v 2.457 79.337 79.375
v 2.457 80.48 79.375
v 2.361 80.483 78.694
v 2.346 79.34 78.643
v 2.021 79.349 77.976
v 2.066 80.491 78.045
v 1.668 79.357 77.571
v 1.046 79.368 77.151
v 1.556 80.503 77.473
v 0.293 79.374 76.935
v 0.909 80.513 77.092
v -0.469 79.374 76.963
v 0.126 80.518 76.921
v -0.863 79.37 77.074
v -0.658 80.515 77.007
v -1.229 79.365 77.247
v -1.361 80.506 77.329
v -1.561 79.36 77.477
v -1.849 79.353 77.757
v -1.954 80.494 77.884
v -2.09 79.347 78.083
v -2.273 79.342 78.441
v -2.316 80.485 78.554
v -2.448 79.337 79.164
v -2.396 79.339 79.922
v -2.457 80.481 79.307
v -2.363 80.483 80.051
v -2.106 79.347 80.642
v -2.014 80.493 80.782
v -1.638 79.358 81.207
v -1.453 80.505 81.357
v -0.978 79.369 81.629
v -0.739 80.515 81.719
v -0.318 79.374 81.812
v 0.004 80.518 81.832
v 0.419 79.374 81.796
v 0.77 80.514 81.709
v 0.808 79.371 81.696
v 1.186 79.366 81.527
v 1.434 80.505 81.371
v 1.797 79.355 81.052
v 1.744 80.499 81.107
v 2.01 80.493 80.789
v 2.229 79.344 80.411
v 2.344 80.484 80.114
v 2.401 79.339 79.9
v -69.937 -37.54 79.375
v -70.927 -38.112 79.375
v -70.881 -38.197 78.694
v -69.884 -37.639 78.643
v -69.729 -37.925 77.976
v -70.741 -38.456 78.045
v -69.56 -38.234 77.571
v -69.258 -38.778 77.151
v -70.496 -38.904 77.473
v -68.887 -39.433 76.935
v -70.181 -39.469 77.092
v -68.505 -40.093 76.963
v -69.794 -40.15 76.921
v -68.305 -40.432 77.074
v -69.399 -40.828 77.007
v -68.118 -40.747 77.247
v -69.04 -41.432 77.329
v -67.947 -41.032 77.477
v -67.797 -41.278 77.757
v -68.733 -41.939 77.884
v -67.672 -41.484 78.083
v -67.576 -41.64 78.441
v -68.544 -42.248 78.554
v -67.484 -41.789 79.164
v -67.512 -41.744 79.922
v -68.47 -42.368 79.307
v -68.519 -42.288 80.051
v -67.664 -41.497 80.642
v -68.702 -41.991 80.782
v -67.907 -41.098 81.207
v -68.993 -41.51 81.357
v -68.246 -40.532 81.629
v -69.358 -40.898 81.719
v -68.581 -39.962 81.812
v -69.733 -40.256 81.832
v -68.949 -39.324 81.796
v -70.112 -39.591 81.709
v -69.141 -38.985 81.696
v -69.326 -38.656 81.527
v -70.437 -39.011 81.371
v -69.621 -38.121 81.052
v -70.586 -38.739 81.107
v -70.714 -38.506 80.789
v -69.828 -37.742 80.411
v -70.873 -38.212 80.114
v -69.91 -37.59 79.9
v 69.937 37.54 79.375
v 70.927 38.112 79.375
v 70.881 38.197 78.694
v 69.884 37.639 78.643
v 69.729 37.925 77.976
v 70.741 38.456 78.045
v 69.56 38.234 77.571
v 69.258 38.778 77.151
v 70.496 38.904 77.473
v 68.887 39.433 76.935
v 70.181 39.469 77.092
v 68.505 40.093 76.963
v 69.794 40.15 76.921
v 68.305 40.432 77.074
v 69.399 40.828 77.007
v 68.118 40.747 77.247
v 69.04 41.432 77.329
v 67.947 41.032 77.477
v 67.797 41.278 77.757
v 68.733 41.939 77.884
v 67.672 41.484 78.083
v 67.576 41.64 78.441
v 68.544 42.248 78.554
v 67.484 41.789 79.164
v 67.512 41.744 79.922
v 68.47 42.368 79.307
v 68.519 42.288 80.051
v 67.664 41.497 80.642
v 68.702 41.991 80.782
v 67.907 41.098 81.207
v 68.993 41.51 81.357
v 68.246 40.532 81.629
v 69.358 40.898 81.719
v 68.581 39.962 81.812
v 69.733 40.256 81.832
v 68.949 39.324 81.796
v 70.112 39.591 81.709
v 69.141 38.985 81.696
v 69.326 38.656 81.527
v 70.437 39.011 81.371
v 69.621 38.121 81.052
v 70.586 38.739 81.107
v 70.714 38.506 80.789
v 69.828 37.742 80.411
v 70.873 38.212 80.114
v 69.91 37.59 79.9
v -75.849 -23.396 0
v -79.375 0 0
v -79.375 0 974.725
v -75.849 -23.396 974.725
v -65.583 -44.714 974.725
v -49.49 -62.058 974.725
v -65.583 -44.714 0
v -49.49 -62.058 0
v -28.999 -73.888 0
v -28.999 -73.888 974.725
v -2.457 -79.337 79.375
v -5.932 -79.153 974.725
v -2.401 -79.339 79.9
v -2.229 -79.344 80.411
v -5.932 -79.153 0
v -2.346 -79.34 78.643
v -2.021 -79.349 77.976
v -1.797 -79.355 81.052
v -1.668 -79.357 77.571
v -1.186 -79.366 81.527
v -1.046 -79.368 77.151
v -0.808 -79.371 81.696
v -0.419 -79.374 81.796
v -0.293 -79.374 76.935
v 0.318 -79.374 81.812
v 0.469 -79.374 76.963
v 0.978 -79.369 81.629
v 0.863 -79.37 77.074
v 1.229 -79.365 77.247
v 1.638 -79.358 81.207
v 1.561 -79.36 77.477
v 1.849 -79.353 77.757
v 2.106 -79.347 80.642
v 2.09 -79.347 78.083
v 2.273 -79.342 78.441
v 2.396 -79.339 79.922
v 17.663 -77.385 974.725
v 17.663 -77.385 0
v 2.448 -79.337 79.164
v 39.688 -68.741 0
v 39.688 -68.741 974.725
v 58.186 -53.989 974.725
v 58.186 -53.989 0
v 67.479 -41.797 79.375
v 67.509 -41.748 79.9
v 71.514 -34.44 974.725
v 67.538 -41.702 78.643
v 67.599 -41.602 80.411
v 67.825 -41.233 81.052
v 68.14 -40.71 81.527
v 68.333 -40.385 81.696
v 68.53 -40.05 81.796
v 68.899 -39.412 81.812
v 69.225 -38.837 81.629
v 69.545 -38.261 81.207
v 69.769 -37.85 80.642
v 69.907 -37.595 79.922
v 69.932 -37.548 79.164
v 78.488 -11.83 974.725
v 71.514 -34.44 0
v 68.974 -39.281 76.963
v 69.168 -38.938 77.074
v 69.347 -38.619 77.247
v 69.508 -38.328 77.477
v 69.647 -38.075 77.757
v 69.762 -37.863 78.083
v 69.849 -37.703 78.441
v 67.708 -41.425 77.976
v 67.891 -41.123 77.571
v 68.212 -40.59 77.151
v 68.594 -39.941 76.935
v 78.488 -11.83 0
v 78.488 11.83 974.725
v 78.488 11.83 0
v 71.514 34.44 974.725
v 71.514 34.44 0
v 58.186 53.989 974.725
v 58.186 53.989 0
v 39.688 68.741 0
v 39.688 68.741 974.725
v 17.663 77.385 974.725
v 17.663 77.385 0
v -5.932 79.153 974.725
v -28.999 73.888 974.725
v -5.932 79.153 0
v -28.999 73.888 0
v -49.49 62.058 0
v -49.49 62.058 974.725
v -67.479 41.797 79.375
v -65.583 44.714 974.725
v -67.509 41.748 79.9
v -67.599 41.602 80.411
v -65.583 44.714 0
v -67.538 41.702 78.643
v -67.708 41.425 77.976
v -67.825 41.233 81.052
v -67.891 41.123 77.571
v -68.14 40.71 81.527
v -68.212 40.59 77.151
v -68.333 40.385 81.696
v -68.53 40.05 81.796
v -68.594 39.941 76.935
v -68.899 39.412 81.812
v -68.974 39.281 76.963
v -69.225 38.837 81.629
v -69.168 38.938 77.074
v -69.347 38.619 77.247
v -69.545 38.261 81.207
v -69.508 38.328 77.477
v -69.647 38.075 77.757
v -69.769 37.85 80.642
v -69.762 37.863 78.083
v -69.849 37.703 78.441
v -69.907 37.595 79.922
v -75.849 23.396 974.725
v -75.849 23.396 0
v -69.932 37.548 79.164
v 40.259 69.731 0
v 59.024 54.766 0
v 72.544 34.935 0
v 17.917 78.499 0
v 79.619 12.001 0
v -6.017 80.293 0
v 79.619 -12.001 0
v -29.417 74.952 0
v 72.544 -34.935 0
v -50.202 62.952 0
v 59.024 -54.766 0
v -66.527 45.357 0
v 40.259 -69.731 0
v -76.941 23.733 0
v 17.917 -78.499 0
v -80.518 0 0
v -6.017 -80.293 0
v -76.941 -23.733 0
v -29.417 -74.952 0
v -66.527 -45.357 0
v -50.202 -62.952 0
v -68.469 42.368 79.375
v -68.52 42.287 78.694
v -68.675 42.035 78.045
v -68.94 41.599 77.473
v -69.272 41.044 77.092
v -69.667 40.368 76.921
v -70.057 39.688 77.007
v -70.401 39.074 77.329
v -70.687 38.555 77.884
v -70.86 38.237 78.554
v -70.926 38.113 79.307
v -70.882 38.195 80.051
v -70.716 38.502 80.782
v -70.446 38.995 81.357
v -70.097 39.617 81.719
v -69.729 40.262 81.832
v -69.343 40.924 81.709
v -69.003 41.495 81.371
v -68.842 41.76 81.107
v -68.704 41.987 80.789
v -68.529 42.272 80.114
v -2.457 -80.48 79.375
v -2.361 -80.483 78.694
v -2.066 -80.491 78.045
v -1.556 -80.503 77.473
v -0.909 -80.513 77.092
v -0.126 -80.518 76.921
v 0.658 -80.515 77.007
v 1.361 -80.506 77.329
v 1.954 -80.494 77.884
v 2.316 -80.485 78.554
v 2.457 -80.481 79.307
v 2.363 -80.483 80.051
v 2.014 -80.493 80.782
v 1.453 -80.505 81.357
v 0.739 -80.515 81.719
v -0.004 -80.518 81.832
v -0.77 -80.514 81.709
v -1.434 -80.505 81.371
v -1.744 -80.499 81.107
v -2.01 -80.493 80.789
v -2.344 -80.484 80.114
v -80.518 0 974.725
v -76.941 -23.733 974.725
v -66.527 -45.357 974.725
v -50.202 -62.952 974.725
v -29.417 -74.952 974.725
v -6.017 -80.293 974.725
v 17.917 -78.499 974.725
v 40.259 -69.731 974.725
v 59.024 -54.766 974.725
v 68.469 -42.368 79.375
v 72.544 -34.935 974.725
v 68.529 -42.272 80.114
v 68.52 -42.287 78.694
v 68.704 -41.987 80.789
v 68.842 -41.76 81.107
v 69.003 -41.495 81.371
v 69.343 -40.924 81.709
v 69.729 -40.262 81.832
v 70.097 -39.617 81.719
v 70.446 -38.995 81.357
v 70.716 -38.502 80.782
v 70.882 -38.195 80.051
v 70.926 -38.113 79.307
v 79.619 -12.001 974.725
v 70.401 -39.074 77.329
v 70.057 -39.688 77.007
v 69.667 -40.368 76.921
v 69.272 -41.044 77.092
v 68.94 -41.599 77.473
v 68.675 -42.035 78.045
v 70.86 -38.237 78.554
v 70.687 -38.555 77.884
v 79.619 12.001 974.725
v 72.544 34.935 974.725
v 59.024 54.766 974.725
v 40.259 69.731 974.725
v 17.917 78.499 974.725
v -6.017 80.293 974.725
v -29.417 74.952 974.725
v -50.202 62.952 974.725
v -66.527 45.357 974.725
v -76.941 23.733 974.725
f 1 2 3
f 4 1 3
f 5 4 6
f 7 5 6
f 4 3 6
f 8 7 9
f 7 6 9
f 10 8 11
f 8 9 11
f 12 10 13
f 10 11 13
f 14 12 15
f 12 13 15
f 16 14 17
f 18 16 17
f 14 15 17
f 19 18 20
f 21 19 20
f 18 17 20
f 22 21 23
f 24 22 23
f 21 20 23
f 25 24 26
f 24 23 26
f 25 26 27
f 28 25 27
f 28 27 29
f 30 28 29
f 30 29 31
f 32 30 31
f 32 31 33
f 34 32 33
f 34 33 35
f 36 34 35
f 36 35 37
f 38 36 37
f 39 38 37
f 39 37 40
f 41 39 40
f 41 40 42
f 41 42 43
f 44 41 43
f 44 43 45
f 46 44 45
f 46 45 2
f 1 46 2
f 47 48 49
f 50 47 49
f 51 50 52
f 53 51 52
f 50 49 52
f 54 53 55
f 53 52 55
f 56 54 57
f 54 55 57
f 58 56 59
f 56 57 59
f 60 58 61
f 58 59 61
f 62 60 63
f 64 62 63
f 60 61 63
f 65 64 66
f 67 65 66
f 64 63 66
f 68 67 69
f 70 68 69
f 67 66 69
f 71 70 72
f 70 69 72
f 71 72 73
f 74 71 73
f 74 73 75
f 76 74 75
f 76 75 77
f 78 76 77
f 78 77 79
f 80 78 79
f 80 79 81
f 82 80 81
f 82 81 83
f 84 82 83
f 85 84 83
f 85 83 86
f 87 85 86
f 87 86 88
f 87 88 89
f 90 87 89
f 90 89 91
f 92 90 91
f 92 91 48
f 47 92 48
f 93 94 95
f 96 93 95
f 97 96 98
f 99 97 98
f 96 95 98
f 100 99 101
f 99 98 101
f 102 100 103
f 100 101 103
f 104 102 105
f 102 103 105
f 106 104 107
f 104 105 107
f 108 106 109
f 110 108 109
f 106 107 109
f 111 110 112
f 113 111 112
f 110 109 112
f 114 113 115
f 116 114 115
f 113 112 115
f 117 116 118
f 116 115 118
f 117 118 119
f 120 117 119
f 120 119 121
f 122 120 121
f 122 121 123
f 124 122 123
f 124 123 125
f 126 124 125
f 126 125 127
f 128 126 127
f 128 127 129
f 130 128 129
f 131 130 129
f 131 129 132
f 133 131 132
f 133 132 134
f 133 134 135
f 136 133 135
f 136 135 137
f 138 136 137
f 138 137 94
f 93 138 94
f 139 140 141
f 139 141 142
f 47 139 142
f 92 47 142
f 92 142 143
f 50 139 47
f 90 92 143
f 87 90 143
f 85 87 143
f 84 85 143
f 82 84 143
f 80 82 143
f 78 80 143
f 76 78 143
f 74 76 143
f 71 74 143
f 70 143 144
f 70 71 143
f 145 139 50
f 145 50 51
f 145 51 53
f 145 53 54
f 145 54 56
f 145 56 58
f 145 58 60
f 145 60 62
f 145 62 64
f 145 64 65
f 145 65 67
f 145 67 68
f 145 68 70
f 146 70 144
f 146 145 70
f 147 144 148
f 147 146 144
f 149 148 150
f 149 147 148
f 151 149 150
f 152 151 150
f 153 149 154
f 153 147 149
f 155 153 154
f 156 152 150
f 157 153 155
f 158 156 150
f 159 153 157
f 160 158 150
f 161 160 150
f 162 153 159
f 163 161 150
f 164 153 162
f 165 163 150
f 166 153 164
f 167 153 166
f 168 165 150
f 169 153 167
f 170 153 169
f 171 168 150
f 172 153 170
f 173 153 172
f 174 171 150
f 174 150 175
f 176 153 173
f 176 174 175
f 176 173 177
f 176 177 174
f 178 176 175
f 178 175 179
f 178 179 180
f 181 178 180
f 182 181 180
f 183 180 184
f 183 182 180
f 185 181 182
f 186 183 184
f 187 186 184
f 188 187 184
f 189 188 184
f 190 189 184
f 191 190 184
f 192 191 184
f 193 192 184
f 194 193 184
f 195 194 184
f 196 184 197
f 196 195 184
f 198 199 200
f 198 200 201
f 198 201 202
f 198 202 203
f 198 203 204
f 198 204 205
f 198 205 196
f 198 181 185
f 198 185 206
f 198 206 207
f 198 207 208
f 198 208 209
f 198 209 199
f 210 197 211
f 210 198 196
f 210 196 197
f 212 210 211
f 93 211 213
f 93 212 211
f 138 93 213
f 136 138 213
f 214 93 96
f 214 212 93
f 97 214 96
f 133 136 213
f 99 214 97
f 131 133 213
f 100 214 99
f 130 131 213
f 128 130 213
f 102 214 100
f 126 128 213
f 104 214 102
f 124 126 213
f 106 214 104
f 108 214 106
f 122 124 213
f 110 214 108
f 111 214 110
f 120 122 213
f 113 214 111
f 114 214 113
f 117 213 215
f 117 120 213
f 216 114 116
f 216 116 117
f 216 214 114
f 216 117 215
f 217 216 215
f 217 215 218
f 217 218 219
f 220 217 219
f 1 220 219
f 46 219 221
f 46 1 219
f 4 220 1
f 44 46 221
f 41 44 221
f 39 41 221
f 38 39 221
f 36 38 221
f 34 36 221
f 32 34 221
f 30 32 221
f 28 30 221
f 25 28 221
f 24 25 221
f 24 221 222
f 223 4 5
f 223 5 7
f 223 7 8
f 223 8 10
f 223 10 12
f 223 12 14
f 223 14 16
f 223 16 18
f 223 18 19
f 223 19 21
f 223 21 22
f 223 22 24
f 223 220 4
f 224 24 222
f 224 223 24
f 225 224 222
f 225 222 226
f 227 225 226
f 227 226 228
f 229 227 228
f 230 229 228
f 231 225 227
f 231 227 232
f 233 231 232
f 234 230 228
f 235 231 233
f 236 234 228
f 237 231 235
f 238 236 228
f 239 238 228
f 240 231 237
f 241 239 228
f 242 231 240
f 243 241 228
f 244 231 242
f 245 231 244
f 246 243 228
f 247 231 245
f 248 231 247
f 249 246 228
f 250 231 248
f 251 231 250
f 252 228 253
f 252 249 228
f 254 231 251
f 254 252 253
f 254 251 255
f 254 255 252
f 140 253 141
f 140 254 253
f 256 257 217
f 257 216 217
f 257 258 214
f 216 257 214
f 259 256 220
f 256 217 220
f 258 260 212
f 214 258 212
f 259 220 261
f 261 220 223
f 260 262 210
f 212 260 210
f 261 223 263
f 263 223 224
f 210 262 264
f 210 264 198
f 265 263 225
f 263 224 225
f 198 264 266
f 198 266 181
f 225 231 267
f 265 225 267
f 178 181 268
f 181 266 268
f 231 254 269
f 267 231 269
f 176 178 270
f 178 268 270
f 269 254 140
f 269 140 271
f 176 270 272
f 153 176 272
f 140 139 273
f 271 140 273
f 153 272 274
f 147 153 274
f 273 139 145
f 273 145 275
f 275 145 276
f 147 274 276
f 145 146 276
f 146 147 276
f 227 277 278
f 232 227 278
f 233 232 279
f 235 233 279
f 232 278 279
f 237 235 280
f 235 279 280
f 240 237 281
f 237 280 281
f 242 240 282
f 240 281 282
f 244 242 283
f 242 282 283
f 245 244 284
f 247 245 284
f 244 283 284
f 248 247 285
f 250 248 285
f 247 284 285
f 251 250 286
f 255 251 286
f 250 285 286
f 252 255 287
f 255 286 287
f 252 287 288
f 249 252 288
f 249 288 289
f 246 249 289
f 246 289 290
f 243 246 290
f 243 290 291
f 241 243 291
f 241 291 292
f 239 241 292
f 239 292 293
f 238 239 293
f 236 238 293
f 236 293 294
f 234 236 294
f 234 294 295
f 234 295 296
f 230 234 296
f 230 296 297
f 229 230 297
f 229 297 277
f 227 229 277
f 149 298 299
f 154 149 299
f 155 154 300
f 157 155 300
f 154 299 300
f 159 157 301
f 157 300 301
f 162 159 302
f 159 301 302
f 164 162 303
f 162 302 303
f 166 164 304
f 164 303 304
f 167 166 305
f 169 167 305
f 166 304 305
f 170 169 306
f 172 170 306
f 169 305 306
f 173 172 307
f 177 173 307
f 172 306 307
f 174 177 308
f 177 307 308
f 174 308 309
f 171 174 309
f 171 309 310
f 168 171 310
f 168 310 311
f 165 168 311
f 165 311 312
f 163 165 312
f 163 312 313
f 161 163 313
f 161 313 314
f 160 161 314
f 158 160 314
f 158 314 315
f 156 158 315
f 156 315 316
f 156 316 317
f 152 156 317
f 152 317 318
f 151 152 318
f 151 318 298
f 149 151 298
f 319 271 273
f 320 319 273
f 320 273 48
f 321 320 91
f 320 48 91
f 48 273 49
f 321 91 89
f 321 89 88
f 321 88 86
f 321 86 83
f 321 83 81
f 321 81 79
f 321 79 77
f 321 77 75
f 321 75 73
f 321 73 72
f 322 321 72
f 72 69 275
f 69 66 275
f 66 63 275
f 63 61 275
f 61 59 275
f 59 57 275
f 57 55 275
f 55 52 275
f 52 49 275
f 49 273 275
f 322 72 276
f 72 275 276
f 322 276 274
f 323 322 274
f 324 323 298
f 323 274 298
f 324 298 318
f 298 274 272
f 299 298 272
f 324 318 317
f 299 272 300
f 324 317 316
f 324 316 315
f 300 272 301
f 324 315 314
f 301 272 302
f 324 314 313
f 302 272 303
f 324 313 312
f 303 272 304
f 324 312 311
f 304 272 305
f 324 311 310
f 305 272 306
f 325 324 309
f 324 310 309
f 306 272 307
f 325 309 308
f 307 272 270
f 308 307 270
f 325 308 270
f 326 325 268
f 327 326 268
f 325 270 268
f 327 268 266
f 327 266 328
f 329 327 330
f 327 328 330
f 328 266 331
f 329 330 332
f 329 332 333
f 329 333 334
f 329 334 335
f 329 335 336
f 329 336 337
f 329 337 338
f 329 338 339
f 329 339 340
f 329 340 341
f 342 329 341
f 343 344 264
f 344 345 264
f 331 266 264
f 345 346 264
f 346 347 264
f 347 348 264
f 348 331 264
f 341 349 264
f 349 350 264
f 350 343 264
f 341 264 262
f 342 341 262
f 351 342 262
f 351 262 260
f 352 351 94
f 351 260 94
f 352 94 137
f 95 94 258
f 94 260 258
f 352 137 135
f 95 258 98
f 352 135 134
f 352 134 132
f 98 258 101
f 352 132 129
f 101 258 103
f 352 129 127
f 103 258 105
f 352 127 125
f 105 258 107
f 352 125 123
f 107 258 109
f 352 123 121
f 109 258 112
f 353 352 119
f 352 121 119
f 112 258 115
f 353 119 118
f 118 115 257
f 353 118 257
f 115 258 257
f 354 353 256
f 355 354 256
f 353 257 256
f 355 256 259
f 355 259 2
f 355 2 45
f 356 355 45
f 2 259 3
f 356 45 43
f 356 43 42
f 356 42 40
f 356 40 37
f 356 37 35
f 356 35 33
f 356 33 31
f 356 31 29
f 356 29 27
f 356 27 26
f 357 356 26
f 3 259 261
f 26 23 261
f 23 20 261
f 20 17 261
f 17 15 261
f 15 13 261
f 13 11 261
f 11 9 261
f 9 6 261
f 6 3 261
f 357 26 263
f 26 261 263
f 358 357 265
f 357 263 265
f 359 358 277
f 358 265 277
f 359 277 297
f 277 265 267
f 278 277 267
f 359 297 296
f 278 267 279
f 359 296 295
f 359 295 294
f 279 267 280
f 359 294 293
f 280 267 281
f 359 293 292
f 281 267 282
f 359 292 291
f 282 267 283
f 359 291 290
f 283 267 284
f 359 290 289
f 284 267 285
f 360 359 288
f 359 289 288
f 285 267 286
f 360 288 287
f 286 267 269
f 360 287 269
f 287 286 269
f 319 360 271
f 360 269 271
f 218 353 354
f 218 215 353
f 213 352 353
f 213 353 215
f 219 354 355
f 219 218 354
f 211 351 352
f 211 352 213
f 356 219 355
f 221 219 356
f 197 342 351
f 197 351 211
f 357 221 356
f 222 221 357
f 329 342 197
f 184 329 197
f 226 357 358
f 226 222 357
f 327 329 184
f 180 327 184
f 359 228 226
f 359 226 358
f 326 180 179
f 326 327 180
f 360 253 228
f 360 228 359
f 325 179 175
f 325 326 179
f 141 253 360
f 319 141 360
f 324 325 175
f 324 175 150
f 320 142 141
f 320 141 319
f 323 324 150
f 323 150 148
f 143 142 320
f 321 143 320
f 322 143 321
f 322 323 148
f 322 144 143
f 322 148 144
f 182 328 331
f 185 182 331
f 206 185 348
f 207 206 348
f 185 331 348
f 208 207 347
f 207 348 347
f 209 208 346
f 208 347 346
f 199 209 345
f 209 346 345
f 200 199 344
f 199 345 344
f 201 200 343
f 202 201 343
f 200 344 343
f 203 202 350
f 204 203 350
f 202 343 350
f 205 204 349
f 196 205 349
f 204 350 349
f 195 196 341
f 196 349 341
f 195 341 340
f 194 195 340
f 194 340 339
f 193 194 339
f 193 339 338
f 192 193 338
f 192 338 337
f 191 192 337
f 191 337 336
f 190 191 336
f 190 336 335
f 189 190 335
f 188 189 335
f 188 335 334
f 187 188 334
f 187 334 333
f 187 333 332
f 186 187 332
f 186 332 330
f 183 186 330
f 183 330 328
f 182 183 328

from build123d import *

# Parameters (mm, degrees)
SKETCH1_R                         = 80.518
SKETCH1_R_2                       = 79.375
BOSS_EXTRUDE1_DEPTH               = 974.725
F_10_0_1935_DIAMETER_HOLE1_REACH  = 993.214
F_10_0_1935_DIAMETER_HOLE1_BORE_R = 2.45745
CIRPATTERN1_COUNT                 = 6


with BuildPart() as part:
    # Sketch1 → Boss-Extrude1 (new body)
    with BuildSketch(Plane.XY):
        with Locations(Location((0, 0, 0), (0, 0, 180))):
            Circle(SKETCH1_R)
        with Locations(Location((0, 0, 0), (0, 0, 180))):
            Circle(SKETCH1_R_2, mode=Mode.SUBTRACT)
    extrude(amount=BOSS_EXTRUDE1_DEPTH)

    # #10 (0.1935) Diameter Hole1 bore → #10 (0.1935) Diameter Hole1 (cut, up to next)
    with BuildSketch(Plane(origin=(0, 80.518, 0), x_dir=(1, 0, 0), z_dir=(0, 1, 0)), mode=Mode.PRIVATE) as f_10_0_1935_diameter_hole1_sk1:
        with Locations((0, -79.375)):
            Circle(F_10_0_1935_DIAMETER_HOLE1_BORE_R)
    f_10_0_1935_diameter_hole1_tool1 = extrude(f_10_0_1935_diameter_hole1_sk1.sketch, amount=-F_10_0_1935_DIAMETER_HOLE1_REACH, mode=Mode.PRIVATE) & part.part
    f_10_0_1935_diameter_hole1 = f_10_0_1935_diameter_hole1_tool1.solids().sort_by_distance((0, 80.518, 79.375))[0]
    add(f_10_0_1935_diameter_hole1, mode=Mode.SUBTRACT)

    # CirPattern1: #10 (0.1935) Diameter Hole1 ×6 about axis
    cirpattern1_axis = Axis((0, 0, 0), (0, 0, 1))
    for i in range(1, CIRPATTERN1_COUNT):
        add(f_10_0_1935_diameter_hole1.rotate(cirpattern1_axis, i * 360 / CIRPATTERN1_COUNT), mode=Mode.SUBTRACT)


solid = part.part
